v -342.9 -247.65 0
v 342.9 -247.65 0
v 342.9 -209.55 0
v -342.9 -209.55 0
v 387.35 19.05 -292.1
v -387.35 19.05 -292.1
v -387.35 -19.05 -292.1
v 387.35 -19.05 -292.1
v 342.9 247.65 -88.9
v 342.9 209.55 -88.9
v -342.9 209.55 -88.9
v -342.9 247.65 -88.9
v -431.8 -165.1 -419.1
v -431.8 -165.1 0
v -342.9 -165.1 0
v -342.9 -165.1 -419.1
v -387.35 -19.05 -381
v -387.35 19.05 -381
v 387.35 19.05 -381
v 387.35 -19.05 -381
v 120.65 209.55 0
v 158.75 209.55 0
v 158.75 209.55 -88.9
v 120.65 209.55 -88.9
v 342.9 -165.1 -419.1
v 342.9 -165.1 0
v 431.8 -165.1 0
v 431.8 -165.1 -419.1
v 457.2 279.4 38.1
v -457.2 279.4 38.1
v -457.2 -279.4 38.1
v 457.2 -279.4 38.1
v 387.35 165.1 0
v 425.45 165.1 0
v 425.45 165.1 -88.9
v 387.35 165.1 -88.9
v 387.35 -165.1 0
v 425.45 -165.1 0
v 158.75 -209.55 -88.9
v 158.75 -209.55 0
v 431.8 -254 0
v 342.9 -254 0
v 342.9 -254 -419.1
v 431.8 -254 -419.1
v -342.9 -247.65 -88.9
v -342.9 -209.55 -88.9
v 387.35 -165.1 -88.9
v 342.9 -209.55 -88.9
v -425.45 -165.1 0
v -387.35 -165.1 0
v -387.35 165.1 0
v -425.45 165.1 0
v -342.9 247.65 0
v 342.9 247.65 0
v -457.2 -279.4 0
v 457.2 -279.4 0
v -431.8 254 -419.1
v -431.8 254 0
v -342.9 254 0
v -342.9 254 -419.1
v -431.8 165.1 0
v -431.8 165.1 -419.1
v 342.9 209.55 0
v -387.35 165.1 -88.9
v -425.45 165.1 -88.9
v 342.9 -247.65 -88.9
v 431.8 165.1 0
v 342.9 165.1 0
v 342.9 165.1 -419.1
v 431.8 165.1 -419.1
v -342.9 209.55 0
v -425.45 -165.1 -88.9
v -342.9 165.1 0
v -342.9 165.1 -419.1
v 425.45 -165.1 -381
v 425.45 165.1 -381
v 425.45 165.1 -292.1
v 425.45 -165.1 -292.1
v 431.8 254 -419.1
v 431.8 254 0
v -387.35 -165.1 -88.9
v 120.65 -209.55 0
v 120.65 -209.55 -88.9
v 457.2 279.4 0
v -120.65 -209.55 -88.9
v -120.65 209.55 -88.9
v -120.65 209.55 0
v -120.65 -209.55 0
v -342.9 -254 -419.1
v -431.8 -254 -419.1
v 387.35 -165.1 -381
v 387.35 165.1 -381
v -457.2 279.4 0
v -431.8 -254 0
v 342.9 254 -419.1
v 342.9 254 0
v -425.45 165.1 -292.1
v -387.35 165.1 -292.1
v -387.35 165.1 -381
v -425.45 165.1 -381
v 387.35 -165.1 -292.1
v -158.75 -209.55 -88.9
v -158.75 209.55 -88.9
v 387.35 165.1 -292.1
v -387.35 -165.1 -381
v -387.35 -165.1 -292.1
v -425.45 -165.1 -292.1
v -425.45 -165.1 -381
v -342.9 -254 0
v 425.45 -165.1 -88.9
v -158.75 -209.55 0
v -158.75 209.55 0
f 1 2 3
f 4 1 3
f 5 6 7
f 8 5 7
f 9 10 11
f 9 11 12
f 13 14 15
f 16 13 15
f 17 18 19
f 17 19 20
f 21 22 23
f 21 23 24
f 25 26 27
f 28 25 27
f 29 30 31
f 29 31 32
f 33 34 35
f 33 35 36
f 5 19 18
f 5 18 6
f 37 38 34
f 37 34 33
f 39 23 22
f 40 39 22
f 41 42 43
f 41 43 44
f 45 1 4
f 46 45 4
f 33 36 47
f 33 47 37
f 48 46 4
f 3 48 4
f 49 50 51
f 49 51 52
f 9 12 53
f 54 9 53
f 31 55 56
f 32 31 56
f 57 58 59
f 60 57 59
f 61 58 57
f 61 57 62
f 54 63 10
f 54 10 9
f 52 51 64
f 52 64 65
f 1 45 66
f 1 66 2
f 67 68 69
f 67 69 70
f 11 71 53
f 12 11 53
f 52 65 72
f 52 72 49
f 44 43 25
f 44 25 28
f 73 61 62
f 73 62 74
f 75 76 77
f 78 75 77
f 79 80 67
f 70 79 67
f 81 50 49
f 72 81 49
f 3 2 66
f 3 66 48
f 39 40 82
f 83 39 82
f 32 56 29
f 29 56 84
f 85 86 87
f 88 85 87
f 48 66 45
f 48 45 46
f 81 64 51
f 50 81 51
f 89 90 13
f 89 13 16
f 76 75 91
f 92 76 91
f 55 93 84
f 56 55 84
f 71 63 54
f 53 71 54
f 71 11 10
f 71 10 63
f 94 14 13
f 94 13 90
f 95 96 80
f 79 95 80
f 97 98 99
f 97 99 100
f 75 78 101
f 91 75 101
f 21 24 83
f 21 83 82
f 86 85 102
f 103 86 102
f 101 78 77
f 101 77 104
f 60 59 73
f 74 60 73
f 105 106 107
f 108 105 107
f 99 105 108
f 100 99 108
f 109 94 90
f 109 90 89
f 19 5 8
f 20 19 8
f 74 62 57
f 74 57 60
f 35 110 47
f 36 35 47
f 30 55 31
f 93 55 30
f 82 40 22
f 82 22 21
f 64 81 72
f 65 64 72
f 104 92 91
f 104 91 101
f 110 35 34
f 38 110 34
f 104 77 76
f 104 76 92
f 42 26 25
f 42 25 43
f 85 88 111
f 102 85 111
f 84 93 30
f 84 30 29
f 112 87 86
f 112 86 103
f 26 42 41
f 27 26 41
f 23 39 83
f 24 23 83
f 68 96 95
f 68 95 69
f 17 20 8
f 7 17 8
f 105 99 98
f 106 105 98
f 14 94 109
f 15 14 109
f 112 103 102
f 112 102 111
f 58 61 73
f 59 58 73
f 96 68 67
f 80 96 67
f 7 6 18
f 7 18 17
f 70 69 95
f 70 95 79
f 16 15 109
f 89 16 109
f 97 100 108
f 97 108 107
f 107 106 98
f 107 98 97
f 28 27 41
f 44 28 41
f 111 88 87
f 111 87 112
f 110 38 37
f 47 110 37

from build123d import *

# Parameters (mm, degrees)
F0_W      = 914.4
F0_H      = 558.8
F1_DEPTH  = 38.1
F2_W      = 88.9
F2_H      = 88.9
F3_DEPTH  = 419.1
F4_W      = 38.1
F4_H      = 88.9
F5_DEPTH  = 330.2
F7_W      = 38.1
F7_H      = 88.9
F8_DEPTH  = 774.7
F9_W      = 38.1
F9_H      = 88.9
F11_DEPTH = 330.2
F10_W     = 38.1
F10_H     = 88.9
F12_DEPTH = 685.8
F13_W     = 38.1
F13_H     = 88.9
F14_DEPTH = 419.1


with BuildPart() as f1:
    # F0 (on Top) → F1 (new body)
    with BuildSketch(Plane.XY):
        Rectangle(F0_W, F0_H)
    extrude(amount=F1_DEPTH)


with BuildPart() as f3:
    # F2 (on face) → F3 (new body)
    with BuildSketch(Plane(origin=(0, 0, 0), x_dir=(1, 0, 0), z_dir=(0, 0, -1))):
        with Locations((-387.35, 209.55)):
            Rectangle(F2_W, F2_H)
        with Locations((387.35, 209.55)):
            Rectangle(F2_W, F2_H)
        with Locations((387.35, -209.55)):
            Rectangle(F2_W, F2_H)
        with Locations((-387.35, -209.55)):
            Rectangle(F2_W, F2_H)
    extrude(amount=F3_DEPTH)


with BuildPart() as f5:
    # F4 (on face) → F5 (new body, through all)
    with BuildSketch(Plane(origin=(0, -165.1, 0), x_dir=(-1, 0, 0), z_dir=(0, 1, 0))):
        with Locations((-406.4, -336.55)):
            Rectangle(F4_W, F4_H)
        with Locations((406.4, -336.55)):
            Rectangle(F4_W, F4_H)
    extrude(amount=F5_DEPTH)


with BuildPart() as f8:
    # F7 (on face) → F8 (new body, through all)
    with BuildSketch(Plane(origin=(387.35, 0, 0), x_dir=(0, -1, 0), z_dir=(-1, 0, 0))):
        with Locations((0, -336.55)):
            Rectangle(F7_W, F7_H)
    extrude(amount=F8_DEPTH)


with BuildPart() as f11:
    # F9 (on face) → F11 (new body, through all)
    with BuildSketch(Plane(origin=(0, -165.1, 0), x_dir=(-1, 0, 0), z_dir=(0, 1, 0))):
        with Locations((406.4, -44.45)):
            Rectangle(F9_W, F9_H)
        with Locations((-406.4, -44.45)):
            Rectangle(F9_W, F9_H)
    extrude(amount=F11_DEPTH)


with BuildPart() as f12:
    # F10 (on face) → F12 (new body, through all)
    with BuildSketch(Plane.YZ.offset(-342.9)):
        with Locations((-228.6, -44.45)):
            Rectangle(F10_W, F10_H)
        with Locations((228.6, -44.45)):
            Rectangle(F10_W, F10_H)
    extrude(amount=F12_DEPTH)


with BuildPart() as f14:
    # F13 (on face) → F14 (new body, through all)
    with BuildSketch(Plane(origin=(0, -209.55, 0), x_dir=(-1, 0, 0), z_dir=(0, 1, 0))):
        with Locations((139.7, -44.45)):
            Rectangle(F13_W, F13_H)
        with Locations((-139.7, -44.45)):
            Rectangle(F13_W, F13_H)
    extrude(amount=F14_DEPTH)


solid = Compound([f1.part, f3.part, f5.part, f8.part, f11.part, f12.part, f14.part])
